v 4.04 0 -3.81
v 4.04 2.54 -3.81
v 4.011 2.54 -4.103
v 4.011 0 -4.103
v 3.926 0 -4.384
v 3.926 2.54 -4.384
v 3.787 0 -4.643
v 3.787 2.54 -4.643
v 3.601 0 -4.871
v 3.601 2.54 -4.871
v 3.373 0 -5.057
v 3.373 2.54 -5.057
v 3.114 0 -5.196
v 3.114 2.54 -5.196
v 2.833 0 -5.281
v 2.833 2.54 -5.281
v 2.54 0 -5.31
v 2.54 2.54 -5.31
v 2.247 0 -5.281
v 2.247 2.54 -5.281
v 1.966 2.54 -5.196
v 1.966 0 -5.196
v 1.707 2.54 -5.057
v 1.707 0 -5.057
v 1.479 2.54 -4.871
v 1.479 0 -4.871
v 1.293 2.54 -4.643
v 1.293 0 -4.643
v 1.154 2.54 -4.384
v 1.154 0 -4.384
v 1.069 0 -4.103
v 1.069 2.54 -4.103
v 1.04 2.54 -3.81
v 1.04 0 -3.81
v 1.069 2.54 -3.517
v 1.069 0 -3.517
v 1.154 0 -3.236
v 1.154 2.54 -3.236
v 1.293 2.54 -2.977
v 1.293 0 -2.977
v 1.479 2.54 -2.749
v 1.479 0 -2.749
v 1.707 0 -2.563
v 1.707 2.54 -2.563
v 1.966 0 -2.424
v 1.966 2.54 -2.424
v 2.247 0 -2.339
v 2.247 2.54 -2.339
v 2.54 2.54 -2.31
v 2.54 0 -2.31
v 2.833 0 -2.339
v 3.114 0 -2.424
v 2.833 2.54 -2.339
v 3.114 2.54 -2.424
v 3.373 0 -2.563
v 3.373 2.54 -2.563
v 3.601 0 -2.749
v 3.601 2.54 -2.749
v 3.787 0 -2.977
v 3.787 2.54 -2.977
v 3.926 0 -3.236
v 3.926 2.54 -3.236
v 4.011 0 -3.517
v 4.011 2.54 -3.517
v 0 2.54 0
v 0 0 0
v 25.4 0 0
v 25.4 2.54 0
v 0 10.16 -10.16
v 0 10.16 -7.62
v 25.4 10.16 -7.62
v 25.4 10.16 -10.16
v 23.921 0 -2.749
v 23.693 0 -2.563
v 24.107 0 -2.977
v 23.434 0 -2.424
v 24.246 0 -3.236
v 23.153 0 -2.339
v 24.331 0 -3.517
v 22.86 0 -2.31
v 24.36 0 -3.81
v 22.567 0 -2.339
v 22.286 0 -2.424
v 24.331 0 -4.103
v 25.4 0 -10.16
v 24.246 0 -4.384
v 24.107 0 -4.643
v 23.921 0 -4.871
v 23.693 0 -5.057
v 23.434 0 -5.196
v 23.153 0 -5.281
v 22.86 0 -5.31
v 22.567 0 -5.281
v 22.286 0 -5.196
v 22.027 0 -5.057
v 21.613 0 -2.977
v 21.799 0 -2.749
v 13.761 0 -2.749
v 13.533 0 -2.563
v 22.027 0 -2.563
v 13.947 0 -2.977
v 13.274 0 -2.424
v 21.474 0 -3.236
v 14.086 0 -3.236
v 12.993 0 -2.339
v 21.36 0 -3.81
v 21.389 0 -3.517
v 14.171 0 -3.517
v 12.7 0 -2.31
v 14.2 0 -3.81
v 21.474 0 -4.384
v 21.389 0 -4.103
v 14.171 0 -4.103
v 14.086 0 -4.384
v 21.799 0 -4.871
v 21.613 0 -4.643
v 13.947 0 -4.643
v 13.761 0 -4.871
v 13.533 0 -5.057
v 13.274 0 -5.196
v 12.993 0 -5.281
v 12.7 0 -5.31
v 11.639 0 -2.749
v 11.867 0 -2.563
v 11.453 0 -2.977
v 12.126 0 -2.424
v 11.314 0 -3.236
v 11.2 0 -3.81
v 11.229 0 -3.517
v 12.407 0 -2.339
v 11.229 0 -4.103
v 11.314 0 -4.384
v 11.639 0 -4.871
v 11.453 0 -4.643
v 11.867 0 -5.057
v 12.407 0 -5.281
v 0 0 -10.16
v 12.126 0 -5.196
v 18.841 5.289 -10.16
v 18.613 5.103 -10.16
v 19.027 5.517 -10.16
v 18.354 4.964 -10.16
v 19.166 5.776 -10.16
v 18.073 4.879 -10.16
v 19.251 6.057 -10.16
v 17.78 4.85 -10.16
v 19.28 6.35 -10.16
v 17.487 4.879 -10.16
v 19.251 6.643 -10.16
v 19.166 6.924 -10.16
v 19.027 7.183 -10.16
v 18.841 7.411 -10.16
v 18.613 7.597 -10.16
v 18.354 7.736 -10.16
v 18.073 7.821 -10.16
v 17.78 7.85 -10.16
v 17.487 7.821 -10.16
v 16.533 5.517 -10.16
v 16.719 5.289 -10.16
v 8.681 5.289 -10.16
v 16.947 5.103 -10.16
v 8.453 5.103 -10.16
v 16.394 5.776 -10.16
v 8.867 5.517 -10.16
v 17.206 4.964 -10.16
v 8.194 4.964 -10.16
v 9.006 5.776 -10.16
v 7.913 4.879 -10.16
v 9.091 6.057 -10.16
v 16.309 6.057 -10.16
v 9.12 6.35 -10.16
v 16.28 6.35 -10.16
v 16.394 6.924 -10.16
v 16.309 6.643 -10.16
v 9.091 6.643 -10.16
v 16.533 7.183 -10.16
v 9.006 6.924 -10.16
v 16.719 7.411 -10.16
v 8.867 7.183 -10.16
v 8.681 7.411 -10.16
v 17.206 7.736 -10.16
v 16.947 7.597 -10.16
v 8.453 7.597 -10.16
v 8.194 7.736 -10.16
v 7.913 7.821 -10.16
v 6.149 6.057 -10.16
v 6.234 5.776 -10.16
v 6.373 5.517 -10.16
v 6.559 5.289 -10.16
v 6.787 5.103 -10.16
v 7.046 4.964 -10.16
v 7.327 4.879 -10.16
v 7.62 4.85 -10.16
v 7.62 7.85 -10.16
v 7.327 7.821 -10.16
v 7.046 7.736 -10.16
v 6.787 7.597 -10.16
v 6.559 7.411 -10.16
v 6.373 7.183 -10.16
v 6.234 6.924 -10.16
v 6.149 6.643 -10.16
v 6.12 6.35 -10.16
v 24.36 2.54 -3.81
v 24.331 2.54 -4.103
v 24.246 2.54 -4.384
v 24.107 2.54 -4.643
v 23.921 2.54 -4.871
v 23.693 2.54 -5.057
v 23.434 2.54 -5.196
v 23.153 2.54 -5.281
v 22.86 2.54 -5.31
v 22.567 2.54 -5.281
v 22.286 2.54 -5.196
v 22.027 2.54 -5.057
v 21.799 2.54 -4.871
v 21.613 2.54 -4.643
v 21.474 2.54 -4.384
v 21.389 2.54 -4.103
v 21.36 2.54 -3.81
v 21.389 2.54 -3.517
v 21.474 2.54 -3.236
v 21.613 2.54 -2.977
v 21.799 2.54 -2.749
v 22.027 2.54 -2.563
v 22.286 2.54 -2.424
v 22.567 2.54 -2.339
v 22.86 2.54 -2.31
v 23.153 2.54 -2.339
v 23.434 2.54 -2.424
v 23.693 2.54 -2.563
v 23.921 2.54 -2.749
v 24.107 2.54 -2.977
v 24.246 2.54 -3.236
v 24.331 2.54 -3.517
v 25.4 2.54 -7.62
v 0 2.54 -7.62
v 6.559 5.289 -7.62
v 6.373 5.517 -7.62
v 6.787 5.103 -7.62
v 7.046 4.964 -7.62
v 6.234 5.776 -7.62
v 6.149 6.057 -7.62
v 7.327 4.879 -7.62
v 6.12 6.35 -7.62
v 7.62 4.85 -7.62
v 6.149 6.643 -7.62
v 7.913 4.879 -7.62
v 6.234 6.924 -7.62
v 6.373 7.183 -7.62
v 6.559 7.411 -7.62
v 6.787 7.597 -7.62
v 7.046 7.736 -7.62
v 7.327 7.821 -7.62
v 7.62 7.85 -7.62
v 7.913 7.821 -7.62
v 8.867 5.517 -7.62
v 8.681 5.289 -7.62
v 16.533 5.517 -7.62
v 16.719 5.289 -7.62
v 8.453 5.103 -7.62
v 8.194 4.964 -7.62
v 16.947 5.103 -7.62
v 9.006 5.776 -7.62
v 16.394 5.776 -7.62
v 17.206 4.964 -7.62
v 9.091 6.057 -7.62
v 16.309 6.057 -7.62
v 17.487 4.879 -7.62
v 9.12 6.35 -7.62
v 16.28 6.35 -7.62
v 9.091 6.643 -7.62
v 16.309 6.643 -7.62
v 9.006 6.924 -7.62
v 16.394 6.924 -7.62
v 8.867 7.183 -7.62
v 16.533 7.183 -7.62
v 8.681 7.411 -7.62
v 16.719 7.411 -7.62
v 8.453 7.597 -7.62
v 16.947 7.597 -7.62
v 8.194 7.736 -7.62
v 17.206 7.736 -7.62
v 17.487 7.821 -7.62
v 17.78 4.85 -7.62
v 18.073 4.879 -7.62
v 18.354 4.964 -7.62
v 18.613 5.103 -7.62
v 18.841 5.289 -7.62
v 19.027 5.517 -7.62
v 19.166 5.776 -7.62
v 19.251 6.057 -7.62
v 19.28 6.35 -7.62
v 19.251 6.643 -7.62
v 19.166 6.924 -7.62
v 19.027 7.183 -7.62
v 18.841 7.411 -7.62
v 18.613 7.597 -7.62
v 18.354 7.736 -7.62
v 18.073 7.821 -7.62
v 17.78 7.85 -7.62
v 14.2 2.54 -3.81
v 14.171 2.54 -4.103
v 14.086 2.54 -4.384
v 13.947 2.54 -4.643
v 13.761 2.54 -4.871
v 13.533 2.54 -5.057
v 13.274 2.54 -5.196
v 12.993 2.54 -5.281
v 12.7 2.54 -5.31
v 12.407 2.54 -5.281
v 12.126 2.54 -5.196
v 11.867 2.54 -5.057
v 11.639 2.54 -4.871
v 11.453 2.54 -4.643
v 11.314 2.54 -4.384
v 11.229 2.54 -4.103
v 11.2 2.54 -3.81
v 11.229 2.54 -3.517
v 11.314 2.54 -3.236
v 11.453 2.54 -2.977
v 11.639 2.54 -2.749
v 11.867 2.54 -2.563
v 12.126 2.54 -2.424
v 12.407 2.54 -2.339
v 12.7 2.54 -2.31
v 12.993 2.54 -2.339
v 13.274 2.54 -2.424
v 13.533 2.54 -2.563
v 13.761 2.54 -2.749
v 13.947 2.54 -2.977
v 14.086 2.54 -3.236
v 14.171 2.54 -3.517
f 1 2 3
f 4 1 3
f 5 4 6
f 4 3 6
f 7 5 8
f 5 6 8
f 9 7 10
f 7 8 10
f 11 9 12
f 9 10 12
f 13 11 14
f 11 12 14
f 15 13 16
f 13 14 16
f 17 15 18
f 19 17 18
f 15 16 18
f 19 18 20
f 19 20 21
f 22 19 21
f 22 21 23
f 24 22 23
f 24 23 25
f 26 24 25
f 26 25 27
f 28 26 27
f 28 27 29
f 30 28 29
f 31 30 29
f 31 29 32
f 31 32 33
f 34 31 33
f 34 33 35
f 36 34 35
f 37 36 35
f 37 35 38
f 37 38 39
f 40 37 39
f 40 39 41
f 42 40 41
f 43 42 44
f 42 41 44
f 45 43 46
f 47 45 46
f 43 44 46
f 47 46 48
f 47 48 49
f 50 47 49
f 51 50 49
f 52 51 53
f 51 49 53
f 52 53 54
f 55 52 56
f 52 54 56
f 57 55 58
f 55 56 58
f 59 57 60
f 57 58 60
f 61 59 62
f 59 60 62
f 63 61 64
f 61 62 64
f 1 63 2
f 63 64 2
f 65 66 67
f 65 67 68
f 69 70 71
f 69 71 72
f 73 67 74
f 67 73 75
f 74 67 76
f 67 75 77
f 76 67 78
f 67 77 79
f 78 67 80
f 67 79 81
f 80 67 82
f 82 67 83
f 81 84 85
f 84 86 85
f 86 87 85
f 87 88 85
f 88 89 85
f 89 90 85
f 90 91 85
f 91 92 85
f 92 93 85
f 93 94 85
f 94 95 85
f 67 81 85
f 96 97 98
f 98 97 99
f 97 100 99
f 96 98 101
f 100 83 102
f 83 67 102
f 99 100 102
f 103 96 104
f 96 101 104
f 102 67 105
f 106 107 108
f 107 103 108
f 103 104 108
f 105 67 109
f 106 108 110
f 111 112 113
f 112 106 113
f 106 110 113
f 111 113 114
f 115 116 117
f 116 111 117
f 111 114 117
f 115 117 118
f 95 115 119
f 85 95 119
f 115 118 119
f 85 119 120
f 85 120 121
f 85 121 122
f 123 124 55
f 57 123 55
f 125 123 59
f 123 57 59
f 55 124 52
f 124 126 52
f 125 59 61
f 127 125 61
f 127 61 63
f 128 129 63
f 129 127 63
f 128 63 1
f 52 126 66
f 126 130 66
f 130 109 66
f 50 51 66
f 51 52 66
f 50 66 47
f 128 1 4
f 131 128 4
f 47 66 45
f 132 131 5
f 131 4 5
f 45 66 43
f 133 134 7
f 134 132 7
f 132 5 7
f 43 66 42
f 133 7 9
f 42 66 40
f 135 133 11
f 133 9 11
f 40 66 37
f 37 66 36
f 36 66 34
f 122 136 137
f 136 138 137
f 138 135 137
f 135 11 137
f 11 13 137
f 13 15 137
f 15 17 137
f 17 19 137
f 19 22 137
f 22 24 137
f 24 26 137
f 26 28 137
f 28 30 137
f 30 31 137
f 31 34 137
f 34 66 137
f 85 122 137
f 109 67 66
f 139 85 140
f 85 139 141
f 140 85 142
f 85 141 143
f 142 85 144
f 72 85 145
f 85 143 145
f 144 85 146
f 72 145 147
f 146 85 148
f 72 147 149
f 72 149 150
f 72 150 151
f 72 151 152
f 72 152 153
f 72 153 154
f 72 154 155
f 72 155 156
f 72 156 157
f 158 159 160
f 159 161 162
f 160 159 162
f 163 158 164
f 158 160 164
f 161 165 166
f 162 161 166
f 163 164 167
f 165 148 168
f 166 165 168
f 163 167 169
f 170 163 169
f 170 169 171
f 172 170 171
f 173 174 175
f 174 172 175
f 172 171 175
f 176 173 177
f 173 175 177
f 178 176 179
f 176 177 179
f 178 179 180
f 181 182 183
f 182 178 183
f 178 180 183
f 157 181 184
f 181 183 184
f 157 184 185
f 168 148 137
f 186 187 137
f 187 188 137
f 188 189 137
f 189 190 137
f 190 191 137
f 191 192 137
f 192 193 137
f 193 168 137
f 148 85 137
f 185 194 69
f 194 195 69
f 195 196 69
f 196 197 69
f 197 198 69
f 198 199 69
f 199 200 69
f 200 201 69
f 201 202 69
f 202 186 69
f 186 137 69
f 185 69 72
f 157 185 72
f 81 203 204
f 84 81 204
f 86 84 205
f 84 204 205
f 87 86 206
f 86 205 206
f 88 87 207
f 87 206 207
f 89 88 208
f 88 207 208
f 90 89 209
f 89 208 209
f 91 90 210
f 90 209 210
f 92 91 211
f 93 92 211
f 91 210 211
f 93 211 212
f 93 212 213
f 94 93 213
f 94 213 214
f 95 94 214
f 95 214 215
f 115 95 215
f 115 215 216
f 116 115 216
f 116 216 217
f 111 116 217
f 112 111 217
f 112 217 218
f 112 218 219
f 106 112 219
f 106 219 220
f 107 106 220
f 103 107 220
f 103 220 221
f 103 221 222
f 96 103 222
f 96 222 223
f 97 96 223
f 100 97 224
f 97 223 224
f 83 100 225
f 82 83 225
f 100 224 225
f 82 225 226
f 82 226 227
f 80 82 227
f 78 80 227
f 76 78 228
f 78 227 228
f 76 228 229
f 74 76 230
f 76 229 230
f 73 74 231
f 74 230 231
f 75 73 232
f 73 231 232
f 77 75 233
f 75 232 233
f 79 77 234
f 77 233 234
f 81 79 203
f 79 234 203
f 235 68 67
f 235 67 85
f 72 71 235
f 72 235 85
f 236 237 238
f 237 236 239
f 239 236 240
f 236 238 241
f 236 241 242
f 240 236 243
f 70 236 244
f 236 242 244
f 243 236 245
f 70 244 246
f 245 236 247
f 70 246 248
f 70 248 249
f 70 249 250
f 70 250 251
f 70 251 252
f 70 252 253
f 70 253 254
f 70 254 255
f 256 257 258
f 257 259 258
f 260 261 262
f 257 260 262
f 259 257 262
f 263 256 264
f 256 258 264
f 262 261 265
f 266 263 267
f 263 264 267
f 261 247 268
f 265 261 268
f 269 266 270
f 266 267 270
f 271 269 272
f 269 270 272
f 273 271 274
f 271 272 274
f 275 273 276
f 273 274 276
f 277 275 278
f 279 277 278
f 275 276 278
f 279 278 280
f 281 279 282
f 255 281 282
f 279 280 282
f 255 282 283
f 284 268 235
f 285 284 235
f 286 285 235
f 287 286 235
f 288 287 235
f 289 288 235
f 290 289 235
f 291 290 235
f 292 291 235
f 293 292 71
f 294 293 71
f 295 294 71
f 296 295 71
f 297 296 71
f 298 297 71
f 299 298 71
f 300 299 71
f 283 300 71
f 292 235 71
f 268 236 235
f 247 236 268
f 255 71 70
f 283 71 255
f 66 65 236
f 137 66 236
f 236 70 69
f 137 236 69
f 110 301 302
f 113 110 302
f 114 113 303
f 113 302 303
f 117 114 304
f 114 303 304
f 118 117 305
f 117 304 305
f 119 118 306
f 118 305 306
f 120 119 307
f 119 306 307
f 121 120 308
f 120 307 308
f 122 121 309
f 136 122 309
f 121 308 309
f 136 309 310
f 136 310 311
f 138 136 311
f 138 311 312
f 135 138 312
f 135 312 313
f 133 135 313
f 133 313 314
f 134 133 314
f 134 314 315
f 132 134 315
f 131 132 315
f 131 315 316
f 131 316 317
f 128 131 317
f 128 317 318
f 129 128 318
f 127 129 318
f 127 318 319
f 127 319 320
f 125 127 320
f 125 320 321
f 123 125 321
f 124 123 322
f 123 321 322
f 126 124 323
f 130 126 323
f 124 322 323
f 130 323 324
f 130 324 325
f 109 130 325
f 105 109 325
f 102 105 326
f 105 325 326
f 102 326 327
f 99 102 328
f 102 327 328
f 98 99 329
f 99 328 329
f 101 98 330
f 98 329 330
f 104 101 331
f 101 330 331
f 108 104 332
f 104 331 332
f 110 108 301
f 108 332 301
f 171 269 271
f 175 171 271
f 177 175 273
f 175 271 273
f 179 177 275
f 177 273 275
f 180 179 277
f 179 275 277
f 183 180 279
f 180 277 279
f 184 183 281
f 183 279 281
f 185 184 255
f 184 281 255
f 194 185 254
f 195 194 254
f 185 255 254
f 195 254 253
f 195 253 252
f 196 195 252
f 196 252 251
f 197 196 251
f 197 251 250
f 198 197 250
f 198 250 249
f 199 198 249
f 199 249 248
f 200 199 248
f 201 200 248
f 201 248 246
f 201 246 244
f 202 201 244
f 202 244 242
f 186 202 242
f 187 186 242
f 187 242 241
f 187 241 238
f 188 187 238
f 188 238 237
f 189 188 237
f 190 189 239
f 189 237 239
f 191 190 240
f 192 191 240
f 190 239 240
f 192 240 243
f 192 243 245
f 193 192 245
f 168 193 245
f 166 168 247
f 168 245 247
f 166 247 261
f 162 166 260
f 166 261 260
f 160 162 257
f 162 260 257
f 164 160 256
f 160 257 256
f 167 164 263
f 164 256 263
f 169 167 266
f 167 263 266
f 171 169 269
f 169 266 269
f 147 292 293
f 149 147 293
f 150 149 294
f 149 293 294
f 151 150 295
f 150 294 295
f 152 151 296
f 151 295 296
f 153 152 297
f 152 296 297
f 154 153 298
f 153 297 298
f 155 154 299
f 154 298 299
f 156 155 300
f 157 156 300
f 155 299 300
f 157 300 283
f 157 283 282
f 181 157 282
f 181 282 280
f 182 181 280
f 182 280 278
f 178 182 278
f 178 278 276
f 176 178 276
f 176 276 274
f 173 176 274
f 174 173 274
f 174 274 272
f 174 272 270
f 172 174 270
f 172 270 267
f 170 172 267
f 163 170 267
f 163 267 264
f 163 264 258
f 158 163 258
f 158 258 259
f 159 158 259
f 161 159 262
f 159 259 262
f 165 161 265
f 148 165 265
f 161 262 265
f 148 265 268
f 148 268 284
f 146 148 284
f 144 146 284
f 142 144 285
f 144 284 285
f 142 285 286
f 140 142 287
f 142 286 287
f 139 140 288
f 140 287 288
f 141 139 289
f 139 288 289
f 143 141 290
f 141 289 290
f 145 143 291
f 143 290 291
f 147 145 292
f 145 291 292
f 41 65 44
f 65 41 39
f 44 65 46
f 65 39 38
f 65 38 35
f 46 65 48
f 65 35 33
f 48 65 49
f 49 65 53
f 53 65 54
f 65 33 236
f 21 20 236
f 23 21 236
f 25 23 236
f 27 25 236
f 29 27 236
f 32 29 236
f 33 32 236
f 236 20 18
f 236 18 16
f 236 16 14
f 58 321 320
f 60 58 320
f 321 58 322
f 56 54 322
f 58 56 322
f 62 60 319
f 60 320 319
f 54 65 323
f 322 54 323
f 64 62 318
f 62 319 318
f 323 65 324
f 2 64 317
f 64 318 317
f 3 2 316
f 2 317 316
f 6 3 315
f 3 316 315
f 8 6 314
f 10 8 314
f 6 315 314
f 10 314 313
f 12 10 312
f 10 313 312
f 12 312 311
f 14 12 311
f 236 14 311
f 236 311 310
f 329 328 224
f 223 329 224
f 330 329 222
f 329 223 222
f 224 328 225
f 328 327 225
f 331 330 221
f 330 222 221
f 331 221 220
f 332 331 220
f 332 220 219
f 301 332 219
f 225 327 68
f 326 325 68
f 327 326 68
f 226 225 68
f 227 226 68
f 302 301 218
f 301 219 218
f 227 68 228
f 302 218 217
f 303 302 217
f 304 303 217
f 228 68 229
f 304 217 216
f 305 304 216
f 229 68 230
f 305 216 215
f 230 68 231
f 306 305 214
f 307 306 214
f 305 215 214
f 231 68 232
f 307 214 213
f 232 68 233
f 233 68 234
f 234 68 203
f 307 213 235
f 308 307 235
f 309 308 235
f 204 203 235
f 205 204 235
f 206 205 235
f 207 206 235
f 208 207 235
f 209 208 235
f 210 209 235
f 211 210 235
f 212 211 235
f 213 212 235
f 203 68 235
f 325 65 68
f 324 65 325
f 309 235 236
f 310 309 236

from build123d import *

# Parameters (mm, degrees)
SKETCH1_W           = 10.16
SKETCH1_H           = 10.16
BOSS_EXTRUDE1_DEPTH = 25.4
SKETCH2_W           = 7.62
SKETCH2_H           = 7.62
CUT_EXTRUDE1_DEPTH  = 26.4
SKETCH3_R           = 1.5
CUT_EXTRUDE2_DEPTH  = 3.54
SKETCH4_R           = 1.5
CUT_EXTRUDE3_DEPTH  = 3.54


with BuildPart() as part:
    # Sketch1 → Boss-Extrude1 (new body)
    with BuildSketch(Plane(origin=(0, 0, 0), x_dir=(0, 0, -1), z_dir=(1, 0, 0))):
        with Locations((5.08, 5.08)):
            Rectangle(SKETCH1_W, SKETCH1_H)
    extrude(amount=BOSS_EXTRUDE1_DEPTH)

    # Sketch2 → Cut-Extrude1 (cut, through all)
    with BuildSketch(Plane(origin=(25.4, 0, 0), x_dir=(0, 0, -1), z_dir=(1, 0, 0))):
        with Locations((3.81, 6.35)):
            Rectangle(SKETCH2_W, SKETCH2_H)
    extrude(amount=-CUT_EXTRUDE1_DEPTH, mode=Mode.SUBTRACT)

    # Sketch3 → Cut-Extrude2 (cut, through all)
    with BuildSketch(Plane.XY.offset(-7.62)):
        with Locations((7.62, 6.35)):
            Circle(SKETCH3_R)
        with Locations((17.78, 6.35)):
            Circle(SKETCH3_R)
    extrude(amount=-CUT_EXTRUDE2_DEPTH, mode=Mode.SUBTRACT)

    # Sketch4 → Cut-Extrude3 (cut, through all)
    with BuildSketch(Plane(origin=(0, 2.54, 0), x_dir=(1, 0, 0), z_dir=(0, 1, 0))):
        with Locations((2.54, 3.81)):
            Circle(SKETCH4_R)
        with Locations((22.86, 3.81)):
            Circle(SKETCH4_R)
        with Locations((12.7, 3.81)):
            Circle(SKETCH4_R)
    extrude(amount=-CUT_EXTRUDE3_DEPTH, mode=Mode.SUBTRACT)


solid = part.part
